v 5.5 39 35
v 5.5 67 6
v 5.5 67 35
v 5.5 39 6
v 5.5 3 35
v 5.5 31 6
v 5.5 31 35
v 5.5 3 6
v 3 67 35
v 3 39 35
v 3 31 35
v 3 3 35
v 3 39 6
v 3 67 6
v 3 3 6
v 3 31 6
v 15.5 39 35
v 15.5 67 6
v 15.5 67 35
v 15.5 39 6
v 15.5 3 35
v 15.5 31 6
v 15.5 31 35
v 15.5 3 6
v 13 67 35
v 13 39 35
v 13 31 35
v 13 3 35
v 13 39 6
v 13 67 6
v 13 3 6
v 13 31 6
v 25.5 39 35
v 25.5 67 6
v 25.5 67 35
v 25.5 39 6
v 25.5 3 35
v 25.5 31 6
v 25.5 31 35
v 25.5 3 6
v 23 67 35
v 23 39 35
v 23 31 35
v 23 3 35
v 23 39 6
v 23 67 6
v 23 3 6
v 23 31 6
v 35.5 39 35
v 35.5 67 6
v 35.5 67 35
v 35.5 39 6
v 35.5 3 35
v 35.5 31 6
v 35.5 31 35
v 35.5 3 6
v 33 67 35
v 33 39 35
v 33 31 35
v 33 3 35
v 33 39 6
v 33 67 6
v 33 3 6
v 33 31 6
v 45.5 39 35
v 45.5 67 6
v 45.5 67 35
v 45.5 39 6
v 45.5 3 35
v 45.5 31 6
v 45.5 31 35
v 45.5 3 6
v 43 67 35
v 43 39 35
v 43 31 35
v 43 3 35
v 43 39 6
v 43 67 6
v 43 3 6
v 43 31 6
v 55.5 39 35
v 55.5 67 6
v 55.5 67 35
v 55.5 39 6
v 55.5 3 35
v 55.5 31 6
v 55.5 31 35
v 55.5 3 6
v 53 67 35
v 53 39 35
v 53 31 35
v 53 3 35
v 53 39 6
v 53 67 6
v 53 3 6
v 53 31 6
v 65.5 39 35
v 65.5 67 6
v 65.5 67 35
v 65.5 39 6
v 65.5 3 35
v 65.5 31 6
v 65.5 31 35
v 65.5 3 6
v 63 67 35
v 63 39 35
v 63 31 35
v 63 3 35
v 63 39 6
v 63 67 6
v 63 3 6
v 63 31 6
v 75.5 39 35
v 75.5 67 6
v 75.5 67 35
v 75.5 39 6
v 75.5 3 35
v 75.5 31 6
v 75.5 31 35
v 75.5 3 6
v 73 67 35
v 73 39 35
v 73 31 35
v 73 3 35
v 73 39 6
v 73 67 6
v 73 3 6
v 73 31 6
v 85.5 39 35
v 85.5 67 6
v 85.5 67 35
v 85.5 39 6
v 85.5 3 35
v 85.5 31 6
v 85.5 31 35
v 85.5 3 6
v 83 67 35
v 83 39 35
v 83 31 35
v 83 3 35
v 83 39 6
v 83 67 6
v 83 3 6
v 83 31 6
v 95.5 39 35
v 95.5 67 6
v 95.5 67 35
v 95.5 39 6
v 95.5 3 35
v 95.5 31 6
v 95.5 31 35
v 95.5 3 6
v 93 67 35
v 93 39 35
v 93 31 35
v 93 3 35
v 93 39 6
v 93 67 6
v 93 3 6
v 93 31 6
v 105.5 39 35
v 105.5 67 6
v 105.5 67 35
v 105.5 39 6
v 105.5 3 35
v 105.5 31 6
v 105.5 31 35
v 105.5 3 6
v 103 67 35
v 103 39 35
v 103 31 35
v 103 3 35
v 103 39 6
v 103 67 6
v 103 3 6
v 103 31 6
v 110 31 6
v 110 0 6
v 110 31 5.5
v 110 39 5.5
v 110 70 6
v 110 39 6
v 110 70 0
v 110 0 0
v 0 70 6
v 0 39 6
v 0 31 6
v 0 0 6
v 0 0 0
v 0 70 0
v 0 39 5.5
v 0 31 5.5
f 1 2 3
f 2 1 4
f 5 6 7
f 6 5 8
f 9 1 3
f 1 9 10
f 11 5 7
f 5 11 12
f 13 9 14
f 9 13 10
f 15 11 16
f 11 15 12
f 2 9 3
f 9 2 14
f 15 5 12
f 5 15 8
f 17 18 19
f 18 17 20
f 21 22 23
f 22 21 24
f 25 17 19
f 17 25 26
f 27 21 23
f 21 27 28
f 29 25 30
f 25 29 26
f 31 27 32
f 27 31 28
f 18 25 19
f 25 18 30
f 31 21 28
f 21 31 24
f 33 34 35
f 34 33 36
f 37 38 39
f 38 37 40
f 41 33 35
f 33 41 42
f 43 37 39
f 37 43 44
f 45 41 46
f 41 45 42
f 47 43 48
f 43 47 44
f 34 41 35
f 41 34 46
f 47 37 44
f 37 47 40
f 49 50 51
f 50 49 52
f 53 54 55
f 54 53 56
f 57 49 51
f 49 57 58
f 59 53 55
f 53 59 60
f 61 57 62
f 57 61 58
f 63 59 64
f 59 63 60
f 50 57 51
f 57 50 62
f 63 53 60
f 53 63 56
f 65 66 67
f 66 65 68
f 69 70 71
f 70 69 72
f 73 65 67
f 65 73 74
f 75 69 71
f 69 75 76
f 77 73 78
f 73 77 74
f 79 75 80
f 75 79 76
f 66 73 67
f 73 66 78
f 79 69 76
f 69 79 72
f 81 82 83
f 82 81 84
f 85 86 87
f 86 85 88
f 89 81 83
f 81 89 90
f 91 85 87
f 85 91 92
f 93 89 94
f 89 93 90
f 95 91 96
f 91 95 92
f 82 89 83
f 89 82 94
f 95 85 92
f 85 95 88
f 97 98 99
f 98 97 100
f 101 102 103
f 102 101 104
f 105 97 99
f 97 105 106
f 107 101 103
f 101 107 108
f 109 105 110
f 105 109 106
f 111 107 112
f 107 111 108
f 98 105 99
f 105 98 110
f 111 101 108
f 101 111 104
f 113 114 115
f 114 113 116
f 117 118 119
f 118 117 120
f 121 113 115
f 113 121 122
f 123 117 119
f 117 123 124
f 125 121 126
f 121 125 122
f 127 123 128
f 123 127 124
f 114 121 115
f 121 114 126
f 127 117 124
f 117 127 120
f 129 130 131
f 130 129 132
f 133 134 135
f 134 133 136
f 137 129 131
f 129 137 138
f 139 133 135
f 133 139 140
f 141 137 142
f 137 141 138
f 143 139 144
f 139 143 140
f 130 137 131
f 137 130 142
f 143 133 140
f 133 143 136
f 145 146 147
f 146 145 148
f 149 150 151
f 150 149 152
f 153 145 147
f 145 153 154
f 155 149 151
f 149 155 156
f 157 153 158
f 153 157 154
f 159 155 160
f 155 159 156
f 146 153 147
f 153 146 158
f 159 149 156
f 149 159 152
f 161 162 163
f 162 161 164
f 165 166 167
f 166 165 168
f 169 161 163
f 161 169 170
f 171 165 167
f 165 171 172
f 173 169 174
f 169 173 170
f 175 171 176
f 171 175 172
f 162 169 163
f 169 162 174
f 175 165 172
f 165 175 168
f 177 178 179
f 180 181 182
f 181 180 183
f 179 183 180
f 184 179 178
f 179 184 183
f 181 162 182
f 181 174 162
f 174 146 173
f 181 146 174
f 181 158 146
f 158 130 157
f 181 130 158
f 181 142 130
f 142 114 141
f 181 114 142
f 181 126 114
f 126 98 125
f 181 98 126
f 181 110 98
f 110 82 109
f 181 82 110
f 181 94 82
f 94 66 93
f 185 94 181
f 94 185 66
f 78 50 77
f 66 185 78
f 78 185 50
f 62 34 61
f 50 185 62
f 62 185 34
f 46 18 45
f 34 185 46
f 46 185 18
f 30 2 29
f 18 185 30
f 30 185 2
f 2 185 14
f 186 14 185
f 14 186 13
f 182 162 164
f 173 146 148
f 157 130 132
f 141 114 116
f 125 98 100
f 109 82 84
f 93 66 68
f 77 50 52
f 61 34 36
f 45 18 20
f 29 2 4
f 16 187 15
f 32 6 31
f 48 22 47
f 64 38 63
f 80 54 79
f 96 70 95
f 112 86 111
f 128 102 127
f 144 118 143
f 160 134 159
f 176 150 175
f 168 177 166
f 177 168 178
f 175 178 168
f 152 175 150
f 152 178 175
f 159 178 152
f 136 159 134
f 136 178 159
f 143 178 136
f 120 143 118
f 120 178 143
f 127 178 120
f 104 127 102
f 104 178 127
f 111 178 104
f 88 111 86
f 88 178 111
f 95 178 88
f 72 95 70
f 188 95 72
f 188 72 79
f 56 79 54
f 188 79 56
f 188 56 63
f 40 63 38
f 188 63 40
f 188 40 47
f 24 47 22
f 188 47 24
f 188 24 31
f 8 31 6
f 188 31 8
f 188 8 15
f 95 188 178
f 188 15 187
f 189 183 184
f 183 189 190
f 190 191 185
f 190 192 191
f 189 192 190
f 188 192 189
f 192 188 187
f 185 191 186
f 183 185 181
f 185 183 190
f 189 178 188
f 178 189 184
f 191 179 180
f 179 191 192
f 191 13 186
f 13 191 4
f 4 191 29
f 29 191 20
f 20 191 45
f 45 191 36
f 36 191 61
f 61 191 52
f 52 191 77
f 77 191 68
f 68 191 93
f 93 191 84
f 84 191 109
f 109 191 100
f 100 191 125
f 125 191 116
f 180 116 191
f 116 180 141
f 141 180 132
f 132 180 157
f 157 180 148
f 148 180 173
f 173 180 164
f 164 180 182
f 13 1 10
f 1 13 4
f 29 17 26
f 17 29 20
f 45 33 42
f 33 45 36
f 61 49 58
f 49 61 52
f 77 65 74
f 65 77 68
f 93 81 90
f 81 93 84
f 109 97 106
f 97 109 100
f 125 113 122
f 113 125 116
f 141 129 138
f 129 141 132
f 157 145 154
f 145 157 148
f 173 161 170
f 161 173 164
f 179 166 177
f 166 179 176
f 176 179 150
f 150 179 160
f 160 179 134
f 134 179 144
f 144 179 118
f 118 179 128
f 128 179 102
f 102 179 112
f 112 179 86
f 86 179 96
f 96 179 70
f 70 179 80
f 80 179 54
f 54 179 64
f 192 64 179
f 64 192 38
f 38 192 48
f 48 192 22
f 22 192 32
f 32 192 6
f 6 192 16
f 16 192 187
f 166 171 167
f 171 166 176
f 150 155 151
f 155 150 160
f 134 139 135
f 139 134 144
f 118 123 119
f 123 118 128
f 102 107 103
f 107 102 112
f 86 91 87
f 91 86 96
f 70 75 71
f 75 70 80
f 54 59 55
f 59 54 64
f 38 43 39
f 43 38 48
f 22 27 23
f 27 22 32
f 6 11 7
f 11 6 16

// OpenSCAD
$fn = 32;

// ----------------------------------------------------------------------
// Heatsink: slotted fin block
// ----------------------------------------------------------------------

// --- parameters (mm) ---
base_l = 110;             // base length, X
base_w = 70;              // base width, Y
base_t = 6;               // base plate thickness
fin_h = 30;               // fin height above the base
fin_t = 2.5;              // fin thickness
edge = 3;                 // margin from the base ends
pitch = 10;               // fin pitch
slot_w = 8;               // central slot width, Y

n_fins = floor((base_l - 2 * edge - fin_t) / pitch) + 1;  // fin count
total_h = base_t + fin_h - 1;  // overall height

difference() {
union() {
  cube([base_l, base_w, base_t]);
  for (i = [0 : n_fins - 1])
    translate([edge + i * pitch, edge, base_t - 1])
      cube([fin_t, base_w - 2 * edge, fin_h]);
}
  translate([-1, base_w / 2 - slot_w / 2, base_t - 0.5])
    cube([base_l + 2, slot_w, fin_h + 2]);
}
